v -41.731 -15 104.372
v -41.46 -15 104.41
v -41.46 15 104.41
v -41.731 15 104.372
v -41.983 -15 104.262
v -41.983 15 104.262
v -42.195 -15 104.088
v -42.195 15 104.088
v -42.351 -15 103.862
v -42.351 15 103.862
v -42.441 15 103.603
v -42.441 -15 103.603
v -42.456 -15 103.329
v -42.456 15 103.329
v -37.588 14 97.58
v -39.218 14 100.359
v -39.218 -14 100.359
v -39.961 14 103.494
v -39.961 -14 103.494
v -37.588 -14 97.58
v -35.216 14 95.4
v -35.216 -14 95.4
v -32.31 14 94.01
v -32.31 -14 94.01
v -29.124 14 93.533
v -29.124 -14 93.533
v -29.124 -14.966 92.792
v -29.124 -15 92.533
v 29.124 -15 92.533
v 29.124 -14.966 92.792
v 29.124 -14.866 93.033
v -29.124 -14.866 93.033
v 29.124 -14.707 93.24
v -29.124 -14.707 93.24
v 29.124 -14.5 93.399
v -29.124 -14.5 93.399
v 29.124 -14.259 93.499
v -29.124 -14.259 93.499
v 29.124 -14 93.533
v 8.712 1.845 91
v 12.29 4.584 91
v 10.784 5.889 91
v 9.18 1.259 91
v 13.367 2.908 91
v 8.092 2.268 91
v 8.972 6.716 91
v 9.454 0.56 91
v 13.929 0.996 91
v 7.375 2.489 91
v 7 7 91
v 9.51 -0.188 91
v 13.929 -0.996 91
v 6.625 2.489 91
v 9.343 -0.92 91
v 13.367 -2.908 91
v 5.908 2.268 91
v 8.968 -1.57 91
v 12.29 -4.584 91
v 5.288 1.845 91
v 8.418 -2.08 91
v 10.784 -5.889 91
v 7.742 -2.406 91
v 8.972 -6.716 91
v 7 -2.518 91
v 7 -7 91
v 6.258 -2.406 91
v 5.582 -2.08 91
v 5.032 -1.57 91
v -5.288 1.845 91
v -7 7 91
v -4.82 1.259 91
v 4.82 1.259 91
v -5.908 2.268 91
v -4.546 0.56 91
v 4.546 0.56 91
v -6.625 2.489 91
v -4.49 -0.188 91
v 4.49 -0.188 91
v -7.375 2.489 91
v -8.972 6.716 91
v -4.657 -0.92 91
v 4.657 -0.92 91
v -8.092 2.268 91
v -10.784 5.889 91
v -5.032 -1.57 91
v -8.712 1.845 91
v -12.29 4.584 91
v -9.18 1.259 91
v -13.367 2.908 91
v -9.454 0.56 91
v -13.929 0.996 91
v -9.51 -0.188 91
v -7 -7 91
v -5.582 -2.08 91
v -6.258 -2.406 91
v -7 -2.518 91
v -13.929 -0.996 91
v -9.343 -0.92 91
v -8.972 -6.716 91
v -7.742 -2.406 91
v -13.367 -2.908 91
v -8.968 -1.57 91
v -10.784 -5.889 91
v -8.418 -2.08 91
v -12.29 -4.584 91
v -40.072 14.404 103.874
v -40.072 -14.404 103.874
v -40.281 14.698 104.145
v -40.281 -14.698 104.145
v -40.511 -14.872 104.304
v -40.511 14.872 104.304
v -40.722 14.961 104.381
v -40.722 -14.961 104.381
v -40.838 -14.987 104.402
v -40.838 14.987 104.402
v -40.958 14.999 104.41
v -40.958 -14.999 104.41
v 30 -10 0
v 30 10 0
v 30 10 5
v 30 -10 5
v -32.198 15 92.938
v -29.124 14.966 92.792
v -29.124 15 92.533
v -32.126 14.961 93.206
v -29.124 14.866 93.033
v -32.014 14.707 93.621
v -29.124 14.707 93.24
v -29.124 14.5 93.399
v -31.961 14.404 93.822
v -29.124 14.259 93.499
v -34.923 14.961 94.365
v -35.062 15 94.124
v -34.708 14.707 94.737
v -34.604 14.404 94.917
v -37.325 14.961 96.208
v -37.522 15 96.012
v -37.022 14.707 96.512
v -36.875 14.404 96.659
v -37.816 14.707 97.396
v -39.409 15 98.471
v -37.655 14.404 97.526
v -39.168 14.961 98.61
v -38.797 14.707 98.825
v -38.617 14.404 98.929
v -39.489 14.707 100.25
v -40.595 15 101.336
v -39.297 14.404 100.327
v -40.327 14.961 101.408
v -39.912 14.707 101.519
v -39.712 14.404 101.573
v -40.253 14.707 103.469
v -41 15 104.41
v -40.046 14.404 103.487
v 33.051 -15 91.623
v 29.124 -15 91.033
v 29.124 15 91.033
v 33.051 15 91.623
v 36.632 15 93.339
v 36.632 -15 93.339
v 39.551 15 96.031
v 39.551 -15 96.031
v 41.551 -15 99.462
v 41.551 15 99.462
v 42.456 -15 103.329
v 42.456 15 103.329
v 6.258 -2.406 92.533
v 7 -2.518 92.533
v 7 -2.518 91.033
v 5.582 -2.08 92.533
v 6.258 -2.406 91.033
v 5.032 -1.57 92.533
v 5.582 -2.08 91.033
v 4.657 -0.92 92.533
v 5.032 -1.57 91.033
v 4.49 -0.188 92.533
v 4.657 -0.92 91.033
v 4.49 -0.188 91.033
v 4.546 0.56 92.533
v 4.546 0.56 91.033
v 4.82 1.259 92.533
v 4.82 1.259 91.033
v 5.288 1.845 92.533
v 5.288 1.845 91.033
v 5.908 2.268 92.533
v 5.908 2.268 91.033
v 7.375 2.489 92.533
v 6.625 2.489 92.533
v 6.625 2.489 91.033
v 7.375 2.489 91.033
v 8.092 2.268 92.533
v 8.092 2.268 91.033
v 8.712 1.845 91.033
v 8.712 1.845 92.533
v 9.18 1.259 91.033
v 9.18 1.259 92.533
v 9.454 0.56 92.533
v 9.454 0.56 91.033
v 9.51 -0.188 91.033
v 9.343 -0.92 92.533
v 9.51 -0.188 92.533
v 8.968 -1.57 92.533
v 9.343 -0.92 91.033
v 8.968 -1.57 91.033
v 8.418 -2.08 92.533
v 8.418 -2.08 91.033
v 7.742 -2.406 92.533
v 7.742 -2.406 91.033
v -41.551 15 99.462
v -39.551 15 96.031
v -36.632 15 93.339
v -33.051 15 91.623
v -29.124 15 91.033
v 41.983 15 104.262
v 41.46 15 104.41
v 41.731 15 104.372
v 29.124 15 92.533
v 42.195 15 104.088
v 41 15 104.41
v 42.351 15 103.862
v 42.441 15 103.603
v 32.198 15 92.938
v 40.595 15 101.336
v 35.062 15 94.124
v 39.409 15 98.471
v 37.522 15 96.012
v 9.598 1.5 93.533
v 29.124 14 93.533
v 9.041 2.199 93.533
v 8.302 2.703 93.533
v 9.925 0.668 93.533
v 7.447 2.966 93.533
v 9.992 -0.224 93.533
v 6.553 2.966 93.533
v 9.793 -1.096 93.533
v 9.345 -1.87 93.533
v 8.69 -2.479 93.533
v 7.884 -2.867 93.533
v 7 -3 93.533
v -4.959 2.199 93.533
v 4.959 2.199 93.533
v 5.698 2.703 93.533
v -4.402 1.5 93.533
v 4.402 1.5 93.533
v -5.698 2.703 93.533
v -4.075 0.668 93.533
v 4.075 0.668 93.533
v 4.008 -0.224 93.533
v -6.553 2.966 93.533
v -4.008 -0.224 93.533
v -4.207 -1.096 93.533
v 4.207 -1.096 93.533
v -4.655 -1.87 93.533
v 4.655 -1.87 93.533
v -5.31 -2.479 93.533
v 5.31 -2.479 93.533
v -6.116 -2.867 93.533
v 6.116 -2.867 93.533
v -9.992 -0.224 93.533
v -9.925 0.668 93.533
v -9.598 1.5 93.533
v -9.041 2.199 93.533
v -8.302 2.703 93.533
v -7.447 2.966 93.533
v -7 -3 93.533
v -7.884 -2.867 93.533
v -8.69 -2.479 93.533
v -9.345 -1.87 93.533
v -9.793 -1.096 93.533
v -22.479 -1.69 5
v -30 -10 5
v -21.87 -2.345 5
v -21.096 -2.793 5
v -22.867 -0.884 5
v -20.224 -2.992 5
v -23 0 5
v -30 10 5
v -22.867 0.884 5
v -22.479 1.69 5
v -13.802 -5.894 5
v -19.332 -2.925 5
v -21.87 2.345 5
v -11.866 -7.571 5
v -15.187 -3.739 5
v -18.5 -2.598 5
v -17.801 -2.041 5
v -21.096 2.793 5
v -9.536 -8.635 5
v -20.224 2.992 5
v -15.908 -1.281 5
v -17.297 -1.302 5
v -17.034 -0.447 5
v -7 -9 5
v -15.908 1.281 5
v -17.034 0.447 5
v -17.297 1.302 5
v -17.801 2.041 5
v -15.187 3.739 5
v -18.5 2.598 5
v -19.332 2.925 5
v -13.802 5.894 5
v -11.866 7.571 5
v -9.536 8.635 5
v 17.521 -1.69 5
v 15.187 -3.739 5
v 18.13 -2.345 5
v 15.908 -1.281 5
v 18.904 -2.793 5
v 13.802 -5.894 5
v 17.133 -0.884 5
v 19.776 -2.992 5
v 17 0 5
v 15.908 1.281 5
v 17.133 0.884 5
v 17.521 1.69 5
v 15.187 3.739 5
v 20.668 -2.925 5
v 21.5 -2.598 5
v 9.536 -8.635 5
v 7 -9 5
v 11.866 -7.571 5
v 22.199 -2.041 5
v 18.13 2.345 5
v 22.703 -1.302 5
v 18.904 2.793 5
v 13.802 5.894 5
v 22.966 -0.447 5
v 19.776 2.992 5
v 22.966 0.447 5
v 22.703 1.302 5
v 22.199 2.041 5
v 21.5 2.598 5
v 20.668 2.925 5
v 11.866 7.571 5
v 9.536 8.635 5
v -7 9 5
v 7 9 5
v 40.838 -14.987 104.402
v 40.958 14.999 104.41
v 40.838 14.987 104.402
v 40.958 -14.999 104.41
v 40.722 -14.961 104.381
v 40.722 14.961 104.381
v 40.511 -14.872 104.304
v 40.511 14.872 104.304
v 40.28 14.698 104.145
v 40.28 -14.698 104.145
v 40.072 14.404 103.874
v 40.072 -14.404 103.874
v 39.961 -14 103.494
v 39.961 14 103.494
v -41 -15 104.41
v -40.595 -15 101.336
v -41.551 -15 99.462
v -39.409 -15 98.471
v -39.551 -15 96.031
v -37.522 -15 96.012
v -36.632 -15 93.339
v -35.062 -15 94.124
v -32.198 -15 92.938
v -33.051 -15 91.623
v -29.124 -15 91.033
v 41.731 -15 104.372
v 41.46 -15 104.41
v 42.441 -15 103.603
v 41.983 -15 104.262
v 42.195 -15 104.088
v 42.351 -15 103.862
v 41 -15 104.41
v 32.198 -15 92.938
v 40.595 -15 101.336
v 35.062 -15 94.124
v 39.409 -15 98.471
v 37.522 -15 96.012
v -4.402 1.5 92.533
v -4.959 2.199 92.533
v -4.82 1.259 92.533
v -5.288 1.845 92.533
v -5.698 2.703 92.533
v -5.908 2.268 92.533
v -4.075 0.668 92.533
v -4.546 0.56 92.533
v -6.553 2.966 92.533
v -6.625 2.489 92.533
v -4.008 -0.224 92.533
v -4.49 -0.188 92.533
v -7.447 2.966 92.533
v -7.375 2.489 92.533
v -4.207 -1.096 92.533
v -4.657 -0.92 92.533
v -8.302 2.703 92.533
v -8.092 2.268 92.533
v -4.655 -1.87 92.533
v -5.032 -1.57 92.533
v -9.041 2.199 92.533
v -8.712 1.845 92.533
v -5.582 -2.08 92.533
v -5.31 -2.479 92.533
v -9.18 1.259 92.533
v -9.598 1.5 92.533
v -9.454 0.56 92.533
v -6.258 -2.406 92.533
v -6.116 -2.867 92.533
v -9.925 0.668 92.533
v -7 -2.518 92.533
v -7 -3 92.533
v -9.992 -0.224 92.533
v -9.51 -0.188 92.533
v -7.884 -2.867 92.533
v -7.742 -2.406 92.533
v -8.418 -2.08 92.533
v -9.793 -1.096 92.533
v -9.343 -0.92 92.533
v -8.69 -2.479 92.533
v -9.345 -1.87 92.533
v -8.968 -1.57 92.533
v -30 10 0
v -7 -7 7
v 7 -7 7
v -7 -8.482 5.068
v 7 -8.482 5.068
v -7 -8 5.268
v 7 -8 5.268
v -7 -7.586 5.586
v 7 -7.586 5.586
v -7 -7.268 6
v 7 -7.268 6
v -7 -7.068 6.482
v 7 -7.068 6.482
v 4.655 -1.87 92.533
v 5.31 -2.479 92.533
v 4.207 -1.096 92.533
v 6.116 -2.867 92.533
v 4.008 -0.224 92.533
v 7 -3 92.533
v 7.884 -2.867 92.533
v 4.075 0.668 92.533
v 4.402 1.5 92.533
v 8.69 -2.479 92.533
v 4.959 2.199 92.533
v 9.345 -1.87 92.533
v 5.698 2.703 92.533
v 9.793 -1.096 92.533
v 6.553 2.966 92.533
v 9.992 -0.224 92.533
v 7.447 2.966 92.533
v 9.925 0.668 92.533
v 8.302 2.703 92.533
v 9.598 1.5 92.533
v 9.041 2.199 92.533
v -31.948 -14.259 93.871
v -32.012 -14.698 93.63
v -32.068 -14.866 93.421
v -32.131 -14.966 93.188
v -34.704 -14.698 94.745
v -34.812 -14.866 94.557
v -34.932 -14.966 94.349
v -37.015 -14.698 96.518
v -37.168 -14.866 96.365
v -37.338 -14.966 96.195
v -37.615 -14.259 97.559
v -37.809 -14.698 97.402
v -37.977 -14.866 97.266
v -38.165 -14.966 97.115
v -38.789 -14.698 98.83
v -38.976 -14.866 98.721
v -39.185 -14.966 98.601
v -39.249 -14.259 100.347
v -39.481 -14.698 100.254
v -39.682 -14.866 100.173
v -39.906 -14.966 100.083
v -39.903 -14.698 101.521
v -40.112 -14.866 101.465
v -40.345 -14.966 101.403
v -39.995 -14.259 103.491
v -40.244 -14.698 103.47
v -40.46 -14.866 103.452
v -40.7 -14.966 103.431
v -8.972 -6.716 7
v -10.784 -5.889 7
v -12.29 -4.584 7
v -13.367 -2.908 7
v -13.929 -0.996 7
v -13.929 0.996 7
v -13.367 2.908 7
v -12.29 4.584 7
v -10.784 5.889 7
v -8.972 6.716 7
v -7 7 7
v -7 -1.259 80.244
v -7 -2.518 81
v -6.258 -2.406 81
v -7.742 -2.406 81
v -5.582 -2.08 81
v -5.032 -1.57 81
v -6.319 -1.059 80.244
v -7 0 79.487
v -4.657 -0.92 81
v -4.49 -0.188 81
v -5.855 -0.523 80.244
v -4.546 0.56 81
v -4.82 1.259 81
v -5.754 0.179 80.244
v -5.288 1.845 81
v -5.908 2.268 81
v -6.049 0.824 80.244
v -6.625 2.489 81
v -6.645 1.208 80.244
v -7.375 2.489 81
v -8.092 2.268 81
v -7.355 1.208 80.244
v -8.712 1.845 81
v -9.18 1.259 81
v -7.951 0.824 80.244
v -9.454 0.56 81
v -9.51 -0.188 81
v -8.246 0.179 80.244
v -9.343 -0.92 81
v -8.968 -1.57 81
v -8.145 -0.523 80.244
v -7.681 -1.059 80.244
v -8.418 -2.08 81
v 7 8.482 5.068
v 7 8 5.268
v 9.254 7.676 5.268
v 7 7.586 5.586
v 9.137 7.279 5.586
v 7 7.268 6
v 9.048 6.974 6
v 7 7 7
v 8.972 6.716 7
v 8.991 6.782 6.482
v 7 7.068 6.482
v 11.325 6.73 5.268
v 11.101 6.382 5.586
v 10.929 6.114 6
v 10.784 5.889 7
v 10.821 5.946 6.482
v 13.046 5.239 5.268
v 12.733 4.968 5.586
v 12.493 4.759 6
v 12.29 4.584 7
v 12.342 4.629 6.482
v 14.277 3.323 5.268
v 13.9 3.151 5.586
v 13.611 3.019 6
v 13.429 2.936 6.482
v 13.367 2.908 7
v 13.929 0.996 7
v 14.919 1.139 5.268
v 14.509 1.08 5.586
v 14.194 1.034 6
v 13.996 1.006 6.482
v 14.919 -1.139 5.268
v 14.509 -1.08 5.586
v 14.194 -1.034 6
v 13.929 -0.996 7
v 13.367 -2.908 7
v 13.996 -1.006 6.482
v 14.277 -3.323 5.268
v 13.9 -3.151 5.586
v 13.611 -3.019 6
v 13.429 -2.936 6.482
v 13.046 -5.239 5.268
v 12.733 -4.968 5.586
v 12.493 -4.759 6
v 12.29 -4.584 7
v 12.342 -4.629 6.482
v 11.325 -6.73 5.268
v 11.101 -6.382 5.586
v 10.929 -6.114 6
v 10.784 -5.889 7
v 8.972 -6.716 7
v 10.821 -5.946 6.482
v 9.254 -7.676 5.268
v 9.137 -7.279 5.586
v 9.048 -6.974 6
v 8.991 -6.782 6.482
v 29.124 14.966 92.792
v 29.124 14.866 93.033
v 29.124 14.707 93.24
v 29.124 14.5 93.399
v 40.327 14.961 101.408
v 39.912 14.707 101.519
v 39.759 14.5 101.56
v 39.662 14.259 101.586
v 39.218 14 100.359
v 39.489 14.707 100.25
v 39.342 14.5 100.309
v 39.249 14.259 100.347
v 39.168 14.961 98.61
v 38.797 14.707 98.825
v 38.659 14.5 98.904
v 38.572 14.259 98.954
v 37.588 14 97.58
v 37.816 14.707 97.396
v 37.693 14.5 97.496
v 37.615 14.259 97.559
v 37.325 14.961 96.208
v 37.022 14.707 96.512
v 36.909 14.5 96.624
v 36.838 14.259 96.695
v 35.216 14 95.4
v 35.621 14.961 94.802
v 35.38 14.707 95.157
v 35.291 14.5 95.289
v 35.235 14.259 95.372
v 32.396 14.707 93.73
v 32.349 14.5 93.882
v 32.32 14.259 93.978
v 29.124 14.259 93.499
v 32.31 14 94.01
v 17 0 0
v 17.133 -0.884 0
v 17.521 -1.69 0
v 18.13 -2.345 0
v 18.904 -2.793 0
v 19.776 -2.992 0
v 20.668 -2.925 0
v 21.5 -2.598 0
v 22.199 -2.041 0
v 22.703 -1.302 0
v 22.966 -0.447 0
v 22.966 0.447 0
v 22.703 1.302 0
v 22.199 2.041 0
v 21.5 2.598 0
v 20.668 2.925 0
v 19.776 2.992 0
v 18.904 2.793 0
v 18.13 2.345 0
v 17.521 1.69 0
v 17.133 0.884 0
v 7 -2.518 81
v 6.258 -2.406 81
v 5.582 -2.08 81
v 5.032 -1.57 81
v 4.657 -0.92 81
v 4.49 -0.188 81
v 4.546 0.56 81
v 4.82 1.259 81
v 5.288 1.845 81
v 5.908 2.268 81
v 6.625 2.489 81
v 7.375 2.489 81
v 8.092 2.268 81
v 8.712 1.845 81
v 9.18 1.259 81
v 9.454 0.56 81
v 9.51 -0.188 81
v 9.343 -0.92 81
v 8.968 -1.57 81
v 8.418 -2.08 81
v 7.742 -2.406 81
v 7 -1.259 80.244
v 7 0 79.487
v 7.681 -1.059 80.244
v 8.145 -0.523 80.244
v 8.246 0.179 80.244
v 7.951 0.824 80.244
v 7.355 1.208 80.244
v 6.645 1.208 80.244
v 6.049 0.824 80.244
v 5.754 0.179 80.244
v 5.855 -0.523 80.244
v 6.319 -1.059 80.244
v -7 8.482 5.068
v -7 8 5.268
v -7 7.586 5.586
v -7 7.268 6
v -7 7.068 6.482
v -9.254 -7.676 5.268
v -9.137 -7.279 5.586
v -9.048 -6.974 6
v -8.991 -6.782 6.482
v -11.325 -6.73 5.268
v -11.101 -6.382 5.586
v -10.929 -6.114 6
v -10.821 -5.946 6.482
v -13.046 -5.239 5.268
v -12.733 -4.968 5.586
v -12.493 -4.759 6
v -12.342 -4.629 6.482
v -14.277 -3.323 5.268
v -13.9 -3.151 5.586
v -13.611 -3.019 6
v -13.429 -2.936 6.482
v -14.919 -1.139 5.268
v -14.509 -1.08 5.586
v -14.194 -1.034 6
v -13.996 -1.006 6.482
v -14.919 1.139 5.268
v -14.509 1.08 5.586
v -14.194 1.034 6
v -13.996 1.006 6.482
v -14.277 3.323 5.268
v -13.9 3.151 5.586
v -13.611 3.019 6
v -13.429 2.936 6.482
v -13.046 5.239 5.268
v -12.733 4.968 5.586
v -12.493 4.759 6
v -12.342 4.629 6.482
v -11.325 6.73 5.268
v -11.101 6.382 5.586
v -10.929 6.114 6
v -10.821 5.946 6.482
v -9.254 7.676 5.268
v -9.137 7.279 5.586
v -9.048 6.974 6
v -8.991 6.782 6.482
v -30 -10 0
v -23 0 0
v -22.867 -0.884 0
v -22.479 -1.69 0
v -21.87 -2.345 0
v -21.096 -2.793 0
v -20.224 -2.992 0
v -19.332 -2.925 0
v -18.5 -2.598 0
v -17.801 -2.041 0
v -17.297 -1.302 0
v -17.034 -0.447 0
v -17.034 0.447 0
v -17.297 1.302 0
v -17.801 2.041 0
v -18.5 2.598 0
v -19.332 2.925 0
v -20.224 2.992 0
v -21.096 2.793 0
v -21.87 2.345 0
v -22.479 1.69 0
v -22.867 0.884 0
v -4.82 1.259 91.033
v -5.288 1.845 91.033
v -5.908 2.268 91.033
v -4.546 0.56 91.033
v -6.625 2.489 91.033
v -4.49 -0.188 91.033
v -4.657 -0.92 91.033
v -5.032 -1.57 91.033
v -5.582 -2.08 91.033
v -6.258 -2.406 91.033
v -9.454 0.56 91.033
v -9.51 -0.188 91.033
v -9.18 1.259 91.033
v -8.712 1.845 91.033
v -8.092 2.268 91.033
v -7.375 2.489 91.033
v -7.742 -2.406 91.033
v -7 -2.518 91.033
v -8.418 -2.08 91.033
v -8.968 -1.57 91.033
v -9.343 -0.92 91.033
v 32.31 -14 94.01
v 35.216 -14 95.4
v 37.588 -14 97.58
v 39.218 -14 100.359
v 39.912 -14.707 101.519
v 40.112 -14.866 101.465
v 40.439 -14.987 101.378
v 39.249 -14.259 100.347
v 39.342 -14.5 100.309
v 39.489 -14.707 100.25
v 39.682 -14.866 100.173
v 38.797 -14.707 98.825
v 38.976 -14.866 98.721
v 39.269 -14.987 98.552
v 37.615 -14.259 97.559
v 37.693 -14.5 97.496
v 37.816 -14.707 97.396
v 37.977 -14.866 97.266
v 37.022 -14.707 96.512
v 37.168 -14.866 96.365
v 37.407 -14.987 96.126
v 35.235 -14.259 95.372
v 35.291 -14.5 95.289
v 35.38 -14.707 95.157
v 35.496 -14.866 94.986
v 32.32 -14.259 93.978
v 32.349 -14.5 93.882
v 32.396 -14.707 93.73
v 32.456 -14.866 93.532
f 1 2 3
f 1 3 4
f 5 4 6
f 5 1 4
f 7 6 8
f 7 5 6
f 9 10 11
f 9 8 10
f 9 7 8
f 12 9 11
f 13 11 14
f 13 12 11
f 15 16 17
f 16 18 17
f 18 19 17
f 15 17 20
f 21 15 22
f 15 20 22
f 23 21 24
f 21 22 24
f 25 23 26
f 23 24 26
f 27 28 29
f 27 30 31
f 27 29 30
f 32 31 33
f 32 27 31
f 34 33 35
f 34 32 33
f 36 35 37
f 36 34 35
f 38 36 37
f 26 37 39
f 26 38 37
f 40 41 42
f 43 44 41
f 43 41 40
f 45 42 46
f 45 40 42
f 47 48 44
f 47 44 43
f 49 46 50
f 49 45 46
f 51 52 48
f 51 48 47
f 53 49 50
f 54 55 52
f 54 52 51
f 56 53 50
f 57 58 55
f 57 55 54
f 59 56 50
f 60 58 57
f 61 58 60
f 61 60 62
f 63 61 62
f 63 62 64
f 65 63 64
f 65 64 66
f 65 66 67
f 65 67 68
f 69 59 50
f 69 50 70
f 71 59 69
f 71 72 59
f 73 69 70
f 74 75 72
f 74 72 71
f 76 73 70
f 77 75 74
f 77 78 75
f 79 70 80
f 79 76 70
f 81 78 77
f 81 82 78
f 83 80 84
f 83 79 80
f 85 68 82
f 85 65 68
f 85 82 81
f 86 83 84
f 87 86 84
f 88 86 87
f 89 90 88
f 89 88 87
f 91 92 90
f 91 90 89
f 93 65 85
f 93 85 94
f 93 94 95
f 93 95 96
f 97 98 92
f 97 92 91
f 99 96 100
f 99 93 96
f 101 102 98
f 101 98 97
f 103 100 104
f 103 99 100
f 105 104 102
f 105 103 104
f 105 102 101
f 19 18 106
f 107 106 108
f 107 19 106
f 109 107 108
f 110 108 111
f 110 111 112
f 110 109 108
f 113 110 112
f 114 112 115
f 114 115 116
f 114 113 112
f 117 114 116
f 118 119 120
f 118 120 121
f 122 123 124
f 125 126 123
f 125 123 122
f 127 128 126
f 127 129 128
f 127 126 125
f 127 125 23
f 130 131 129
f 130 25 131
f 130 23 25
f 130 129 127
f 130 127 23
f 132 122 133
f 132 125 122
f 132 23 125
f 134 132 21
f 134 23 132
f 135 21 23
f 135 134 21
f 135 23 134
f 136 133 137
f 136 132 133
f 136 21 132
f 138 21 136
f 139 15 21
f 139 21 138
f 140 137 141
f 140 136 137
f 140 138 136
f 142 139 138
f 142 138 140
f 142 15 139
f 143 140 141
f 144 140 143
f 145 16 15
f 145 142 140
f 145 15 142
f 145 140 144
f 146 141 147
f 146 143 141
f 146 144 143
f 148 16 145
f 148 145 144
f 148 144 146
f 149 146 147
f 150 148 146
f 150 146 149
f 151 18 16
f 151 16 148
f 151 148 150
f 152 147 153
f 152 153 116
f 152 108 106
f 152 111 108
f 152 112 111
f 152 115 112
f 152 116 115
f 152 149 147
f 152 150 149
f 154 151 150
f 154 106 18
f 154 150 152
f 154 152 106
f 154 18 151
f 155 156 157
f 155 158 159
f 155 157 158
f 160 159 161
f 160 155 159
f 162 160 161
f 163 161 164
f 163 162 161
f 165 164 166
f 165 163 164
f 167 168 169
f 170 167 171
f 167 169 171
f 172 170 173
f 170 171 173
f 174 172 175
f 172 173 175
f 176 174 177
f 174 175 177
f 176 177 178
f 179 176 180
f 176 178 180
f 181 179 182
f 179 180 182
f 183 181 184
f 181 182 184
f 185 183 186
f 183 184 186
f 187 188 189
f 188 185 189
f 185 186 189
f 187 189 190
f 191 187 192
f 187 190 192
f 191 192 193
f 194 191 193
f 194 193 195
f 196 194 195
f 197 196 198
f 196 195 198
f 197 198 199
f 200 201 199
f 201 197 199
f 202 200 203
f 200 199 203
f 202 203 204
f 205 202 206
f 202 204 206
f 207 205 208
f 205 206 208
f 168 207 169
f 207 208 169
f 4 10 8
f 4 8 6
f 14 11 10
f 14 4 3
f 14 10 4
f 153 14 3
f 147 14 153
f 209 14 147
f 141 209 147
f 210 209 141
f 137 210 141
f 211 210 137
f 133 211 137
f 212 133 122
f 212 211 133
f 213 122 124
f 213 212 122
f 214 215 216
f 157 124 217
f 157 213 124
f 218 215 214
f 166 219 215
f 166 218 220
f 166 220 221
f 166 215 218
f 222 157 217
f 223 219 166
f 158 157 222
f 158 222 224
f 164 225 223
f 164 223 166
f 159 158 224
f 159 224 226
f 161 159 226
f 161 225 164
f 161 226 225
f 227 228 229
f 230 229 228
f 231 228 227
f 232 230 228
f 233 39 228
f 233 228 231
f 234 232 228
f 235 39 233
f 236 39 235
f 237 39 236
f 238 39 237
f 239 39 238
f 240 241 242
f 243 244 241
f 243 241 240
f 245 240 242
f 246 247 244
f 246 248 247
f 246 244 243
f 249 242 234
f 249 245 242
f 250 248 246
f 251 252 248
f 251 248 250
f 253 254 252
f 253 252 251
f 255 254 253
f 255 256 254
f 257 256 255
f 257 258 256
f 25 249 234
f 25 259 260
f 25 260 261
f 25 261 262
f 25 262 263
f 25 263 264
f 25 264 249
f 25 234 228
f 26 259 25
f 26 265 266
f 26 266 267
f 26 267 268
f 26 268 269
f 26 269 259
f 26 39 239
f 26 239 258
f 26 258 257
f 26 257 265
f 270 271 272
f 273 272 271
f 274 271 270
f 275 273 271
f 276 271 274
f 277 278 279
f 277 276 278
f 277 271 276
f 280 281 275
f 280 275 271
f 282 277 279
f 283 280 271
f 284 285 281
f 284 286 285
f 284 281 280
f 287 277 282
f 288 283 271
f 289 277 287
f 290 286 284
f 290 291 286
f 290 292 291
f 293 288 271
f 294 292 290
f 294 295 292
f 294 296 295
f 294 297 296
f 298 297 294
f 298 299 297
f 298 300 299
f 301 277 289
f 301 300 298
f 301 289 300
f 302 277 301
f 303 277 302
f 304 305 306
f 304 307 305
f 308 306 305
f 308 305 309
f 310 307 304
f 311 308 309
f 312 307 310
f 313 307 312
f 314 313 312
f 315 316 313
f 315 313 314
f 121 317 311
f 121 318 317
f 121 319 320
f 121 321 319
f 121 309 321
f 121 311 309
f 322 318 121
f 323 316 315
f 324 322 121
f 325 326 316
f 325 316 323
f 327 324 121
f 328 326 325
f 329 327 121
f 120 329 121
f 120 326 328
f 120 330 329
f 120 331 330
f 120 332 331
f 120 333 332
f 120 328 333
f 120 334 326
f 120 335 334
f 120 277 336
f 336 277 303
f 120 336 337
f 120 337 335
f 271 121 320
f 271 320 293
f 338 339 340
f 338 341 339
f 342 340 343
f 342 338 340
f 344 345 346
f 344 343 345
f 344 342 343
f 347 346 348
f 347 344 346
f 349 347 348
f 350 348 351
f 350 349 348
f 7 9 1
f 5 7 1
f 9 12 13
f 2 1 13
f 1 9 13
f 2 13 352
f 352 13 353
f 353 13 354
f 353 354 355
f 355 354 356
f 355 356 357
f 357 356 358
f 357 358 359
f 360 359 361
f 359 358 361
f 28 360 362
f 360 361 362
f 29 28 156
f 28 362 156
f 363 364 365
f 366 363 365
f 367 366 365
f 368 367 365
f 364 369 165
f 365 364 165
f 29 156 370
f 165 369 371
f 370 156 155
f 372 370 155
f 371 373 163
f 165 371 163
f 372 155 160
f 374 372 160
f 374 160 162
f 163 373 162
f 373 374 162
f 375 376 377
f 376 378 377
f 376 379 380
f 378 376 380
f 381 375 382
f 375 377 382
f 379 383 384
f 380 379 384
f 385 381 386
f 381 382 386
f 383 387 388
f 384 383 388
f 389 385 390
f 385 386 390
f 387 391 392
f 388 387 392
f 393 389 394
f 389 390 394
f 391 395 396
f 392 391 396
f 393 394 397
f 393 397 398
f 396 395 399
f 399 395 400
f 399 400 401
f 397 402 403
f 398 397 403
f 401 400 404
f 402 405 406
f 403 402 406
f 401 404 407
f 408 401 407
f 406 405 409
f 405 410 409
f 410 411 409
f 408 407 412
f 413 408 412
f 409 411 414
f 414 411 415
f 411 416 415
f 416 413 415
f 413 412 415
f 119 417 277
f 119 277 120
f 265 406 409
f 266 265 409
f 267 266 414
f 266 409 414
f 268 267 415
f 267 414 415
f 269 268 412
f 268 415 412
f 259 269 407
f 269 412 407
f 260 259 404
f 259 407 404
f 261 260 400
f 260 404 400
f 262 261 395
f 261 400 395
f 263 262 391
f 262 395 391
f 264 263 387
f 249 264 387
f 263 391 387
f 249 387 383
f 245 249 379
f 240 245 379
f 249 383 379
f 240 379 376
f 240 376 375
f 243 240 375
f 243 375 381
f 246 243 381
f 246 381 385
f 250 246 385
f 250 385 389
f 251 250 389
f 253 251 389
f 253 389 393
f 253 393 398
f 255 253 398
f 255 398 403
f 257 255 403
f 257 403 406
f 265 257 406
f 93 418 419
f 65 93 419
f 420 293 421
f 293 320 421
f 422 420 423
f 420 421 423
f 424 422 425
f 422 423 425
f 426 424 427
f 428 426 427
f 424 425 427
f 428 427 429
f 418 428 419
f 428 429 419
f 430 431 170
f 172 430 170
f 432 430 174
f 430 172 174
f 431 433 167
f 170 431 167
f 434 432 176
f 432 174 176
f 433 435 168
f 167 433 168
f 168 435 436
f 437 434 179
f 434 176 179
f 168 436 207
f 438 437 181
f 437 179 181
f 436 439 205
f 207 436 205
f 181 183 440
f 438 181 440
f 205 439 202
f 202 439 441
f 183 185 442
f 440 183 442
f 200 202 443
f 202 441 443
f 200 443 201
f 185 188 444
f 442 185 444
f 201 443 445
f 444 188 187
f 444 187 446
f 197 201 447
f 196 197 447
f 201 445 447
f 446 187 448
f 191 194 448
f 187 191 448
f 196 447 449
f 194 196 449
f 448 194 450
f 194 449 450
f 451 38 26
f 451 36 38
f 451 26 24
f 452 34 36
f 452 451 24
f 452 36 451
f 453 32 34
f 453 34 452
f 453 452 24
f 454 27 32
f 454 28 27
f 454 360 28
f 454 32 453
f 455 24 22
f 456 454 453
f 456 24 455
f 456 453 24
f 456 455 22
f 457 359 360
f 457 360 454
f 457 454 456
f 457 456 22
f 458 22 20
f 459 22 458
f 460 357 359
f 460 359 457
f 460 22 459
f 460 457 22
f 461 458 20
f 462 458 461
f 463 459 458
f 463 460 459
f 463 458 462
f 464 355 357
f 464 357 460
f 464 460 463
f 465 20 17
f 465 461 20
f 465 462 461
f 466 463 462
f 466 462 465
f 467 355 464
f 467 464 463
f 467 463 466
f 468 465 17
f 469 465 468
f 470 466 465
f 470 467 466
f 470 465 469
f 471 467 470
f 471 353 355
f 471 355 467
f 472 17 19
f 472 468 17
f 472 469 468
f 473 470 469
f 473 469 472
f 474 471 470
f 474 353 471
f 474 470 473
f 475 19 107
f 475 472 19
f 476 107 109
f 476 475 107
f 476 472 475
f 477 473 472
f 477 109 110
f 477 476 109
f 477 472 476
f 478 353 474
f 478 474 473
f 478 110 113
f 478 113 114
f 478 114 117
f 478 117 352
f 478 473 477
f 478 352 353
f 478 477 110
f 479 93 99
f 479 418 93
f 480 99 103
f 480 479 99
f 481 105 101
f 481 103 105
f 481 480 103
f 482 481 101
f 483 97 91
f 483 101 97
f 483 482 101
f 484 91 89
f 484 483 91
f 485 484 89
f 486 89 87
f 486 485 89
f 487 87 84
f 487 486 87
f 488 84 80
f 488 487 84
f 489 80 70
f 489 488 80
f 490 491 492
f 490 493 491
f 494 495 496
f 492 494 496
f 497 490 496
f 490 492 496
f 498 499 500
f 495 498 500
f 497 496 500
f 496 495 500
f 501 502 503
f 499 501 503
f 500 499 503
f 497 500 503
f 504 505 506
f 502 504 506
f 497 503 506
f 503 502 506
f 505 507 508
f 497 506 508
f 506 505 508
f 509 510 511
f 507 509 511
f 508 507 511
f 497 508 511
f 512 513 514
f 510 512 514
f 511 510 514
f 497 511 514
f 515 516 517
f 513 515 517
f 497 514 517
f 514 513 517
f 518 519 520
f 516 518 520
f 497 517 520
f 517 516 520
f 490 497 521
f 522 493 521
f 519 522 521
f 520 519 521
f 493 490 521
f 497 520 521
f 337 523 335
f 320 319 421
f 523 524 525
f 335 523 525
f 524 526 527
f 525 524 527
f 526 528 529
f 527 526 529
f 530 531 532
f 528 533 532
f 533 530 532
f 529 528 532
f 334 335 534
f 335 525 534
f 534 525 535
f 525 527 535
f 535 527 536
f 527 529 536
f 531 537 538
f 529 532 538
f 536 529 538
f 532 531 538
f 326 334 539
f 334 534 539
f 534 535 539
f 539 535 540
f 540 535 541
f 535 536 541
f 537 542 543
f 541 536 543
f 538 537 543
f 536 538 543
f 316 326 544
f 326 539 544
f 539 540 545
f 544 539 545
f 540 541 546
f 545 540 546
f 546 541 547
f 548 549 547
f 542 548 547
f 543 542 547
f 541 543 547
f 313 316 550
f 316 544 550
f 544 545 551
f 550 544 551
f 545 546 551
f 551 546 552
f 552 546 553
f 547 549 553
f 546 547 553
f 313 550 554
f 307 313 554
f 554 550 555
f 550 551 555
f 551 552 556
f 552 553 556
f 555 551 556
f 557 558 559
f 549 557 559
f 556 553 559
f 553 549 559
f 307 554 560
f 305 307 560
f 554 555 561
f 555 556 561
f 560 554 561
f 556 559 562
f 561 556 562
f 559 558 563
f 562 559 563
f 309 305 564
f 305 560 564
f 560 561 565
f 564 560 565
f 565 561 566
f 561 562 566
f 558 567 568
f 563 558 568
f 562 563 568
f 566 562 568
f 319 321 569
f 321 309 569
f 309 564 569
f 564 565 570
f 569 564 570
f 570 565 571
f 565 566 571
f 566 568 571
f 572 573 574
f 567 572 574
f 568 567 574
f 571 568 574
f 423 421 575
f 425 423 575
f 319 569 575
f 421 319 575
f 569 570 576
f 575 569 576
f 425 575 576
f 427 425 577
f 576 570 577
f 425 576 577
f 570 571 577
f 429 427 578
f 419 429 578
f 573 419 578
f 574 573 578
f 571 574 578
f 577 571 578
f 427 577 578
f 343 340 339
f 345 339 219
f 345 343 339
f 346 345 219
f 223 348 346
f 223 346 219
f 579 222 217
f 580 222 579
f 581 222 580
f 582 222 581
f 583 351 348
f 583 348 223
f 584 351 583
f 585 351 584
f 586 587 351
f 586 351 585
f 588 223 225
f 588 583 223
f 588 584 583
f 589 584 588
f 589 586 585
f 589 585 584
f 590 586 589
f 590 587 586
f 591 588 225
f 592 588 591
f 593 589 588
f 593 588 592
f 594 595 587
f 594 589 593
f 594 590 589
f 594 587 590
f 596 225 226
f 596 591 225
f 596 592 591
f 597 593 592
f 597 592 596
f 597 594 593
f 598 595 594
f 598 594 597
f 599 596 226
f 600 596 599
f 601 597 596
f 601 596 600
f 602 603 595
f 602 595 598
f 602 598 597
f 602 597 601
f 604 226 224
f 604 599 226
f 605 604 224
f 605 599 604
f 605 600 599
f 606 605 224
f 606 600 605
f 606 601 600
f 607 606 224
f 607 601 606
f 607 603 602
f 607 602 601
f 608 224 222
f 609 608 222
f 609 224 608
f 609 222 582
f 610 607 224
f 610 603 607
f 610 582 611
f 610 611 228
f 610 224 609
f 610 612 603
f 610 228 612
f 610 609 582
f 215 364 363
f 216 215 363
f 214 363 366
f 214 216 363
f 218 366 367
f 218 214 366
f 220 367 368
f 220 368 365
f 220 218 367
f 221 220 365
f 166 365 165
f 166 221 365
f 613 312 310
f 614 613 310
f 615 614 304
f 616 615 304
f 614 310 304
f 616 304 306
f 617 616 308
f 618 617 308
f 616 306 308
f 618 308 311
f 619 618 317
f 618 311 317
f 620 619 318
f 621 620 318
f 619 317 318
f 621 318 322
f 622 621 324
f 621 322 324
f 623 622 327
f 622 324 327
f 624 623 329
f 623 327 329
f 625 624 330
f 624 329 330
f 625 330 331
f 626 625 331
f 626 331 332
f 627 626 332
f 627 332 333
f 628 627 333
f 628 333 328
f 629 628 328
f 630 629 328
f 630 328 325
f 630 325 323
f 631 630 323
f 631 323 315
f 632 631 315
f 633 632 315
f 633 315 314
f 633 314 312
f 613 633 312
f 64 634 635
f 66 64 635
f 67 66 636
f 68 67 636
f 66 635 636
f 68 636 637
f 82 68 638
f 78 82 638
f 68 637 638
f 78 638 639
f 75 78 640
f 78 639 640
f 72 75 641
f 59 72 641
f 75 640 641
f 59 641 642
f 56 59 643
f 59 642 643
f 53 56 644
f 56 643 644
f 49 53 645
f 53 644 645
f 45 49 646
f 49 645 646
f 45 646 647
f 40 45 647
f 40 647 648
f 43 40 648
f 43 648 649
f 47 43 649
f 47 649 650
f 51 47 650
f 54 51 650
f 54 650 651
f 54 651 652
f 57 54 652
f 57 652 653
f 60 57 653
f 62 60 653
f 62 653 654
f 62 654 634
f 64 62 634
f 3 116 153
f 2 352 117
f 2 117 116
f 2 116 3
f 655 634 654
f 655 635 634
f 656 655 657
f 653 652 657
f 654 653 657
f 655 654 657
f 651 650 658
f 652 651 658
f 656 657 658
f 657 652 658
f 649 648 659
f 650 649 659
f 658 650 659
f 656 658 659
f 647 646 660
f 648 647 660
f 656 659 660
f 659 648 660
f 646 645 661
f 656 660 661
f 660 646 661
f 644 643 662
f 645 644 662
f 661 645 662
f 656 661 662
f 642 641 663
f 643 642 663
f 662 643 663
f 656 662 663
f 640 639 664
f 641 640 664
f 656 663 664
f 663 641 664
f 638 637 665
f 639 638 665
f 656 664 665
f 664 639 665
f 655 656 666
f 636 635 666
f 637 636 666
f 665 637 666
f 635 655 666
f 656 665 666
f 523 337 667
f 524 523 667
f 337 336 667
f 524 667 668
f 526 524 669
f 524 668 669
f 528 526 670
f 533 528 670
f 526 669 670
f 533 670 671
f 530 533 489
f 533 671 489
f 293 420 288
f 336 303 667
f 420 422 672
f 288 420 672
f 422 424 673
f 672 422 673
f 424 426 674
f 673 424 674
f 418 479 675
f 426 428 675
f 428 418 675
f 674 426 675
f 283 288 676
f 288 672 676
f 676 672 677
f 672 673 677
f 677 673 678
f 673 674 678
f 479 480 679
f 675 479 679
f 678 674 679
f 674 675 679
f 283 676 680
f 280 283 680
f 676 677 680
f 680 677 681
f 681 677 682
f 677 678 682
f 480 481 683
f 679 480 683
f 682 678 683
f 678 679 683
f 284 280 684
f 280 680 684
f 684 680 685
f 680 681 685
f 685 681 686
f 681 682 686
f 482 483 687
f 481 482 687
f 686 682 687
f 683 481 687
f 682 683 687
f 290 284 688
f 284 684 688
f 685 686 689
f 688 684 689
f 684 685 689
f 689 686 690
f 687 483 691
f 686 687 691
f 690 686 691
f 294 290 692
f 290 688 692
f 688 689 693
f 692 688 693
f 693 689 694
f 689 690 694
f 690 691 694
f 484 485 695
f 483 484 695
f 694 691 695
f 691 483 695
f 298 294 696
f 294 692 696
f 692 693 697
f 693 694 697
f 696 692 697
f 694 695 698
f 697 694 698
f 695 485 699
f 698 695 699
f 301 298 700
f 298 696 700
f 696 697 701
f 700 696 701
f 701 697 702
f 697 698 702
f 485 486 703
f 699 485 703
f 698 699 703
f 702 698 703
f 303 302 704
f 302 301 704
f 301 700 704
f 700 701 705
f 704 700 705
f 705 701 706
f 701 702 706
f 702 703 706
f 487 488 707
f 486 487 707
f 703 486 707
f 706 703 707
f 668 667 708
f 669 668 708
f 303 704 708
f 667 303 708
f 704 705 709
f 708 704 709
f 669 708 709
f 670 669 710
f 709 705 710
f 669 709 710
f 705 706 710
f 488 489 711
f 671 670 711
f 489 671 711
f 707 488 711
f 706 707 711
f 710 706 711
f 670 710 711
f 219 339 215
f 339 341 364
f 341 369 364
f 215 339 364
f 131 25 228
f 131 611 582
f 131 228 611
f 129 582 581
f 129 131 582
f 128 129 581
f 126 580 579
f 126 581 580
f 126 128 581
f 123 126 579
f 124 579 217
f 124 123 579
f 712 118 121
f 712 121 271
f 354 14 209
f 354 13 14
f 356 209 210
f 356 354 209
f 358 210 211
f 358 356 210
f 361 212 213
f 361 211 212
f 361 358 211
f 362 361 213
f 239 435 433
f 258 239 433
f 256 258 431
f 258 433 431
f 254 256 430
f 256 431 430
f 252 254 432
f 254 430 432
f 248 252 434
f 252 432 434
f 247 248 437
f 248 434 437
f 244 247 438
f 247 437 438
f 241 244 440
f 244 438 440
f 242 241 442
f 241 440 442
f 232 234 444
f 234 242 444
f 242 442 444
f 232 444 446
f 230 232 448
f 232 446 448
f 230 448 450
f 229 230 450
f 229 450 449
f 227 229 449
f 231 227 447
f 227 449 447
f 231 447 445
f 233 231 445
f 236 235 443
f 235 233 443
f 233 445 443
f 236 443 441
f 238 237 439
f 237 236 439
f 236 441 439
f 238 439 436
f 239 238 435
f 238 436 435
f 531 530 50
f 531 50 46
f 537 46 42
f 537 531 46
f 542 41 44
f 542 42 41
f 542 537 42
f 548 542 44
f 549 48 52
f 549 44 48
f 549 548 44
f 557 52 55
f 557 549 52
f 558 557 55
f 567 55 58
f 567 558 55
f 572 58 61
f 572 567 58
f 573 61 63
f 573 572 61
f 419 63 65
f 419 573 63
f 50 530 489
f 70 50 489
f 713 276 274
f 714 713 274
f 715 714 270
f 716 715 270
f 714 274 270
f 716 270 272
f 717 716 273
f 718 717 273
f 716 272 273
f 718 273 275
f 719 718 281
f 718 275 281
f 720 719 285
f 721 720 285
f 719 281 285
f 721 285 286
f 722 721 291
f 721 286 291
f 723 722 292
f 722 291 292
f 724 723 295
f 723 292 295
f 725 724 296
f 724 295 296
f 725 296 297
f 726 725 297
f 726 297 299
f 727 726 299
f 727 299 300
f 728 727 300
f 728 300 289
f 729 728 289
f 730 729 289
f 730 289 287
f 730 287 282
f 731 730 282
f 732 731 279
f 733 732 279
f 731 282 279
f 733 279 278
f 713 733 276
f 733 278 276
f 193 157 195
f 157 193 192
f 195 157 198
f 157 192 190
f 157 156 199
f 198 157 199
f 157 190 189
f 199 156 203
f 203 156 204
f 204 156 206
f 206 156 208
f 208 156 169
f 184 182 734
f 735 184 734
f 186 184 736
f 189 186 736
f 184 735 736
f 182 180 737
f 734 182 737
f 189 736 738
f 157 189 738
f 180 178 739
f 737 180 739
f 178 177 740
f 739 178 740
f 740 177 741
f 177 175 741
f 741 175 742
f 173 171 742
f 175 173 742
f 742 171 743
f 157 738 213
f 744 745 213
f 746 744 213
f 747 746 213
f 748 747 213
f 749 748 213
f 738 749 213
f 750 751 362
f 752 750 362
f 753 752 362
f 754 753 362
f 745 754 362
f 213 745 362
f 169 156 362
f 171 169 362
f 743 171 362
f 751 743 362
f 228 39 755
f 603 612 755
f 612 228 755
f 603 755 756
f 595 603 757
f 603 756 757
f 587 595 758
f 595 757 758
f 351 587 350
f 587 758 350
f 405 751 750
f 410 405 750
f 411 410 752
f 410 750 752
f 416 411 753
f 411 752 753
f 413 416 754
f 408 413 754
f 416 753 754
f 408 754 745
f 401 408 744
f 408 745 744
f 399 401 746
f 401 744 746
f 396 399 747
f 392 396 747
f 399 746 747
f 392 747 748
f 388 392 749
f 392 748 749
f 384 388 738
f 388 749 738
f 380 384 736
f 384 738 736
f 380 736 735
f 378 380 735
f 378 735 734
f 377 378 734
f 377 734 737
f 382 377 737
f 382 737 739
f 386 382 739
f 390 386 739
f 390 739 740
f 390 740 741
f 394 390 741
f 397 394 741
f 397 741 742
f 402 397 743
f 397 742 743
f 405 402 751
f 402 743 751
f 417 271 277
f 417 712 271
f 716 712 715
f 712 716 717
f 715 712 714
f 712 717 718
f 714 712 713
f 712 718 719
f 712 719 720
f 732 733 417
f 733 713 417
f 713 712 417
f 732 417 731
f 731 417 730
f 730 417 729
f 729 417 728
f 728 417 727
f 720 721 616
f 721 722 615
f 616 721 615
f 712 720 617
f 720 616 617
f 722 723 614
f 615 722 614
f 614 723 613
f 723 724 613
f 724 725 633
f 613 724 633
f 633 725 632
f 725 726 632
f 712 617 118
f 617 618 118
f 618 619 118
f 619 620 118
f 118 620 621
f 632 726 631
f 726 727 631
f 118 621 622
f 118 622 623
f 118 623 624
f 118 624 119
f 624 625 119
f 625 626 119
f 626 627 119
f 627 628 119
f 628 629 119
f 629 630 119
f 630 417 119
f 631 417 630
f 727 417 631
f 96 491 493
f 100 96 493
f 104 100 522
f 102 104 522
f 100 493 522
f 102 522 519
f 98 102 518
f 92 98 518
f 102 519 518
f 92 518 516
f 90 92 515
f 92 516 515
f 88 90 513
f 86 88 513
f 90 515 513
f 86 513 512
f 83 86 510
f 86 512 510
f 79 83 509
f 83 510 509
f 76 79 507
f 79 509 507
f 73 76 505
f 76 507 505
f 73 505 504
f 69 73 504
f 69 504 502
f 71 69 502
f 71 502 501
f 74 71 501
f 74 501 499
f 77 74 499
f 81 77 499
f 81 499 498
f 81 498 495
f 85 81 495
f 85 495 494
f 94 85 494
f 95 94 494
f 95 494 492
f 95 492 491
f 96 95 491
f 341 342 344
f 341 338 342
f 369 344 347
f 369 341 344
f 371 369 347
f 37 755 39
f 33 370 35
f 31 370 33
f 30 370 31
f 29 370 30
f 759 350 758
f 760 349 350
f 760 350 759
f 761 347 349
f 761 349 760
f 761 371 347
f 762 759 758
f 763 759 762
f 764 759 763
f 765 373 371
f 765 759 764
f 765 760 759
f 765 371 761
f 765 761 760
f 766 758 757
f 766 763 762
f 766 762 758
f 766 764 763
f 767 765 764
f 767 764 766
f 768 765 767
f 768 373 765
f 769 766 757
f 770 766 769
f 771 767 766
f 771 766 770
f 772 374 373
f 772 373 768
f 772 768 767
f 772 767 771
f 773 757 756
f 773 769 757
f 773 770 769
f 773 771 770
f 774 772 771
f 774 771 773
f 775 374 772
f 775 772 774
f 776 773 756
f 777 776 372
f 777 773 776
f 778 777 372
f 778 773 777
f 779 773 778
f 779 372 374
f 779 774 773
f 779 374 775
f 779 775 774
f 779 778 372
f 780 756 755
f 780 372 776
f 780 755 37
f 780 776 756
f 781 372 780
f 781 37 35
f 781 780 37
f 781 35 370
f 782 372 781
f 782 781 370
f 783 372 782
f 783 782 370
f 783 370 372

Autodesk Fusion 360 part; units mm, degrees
sketch "Boceto1" plane through (0, 0, 0) normal (0, 0, 1) x (1, 0, 0)
  line L0 (-30, 10) -> (30, 10)
  line L1 (30, 10) -> (30, -10)
  line L2 (30, -10) -> (-30, -10)
  line L3 (-30, -10) -> (-30, 10)
  point P0 (0, 10)
  point P1 (-30, 0)
  dimension "d1" = 60
  dimension "d2" = 20
extrude "Extruir1" add sketch "Boceto1" along normal blind 5 makes body 1
sketch "Boceto2" plane through (0, 0, 5) normal (0, 0, 1) x (-1, 0, 0)
  line L0 (30, 10) -> (-30, 10)
  line L1 (-30, 10) -> (-30, -10)
  line L2 (-30, -10) -> (30, -10)
  line L3 (30, -10) -> (30, 10)
  line L4 (7, 7) -> (-7, 7)
  arc A0 (-7, 7) -> (-7, -7) centre (-7, 0) ccw
  line L5 (-7, -7) -> (7, -7)
  arc A1 (7, -7) -> (7, 7) centre (7, 0) ccw
  line L6 (7, 0) -> (-7, 0) construction
  dimension "d30" = 14
  dimension "d31" = 7
extrude "Extruir2" add sketch "Boceto2" along normal blind 86 contours L4 A0 L5 A1 bodies 1
sketch "Boceto3" plane through (0, 0, 0) normal (0, 1, 0) x (1, 0, 0)
  arc A0 (42.5, -104.4096) -> (29.1237, -91.0333) centre (29.1237, -104.4096) ccw
  line L0 (29.1237, -91.0333) -> (-29.1237, -91.0333)
  arc A1 (-29.1237, -91.0333) -> (-42.5, -104.4096) centre (-29.1237, -104.4096) ccw
  line L1 (-29.1237, -104.4096) -> (29.1237, -104.4096) construction
  arc A2 (40, -104.4096) -> (29.1237, -93.5333) centre (29.1237, -104.4096) ccw
  line L2 (29.1237, -93.5333) -> (-29.1237, -93.5333)
  arc A3 (-29.1237, -93.5333) -> (-40, -104.4096) centre (-29.1237, -104.4096) ccw
  line L3 (-29.1237, -104.4096) -> (29.1237, -104.4096) construction
  line L4 (-40, -104.4096) -> (-42.5, -104.4096)
  line L5 (40, -104.4096) -> (42.5, -104.4096)
  point P0 (0, -104.4096)
  dimension "d9" = 85
extrude "Extruir3" add sketch "Boceto3" along normal blind 15 and the other way blind 15 separate body makes body 2
fillet "Empalme1" radius 2 4 edges at (14, 0, 5) (0, -7, 5) (-14, 0, 5) (0, 7, 5) on bodies 1
sketch "Boceto4" plane through (0, 0, 5) normal (0, 0, 1) x (-1, 0, 0)
  line L0 (30, 10) -> (-30, 10)
  line L1 (-30, 10) -> (-30, -10)
  line L2 (-30, -10) -> (30, -10)
  line L3 (30, -10) -> (30, 10)
  circle A0 centre (20, 0) radius 3
  circle A1 centre (-20, 0) radius 3
  arc A2 (-7, 9) -> (-7, -9) centre (-7, 0) ccw
  line L4 (-7, 9) -> (7, 9)
  arc A3 (7, -9) -> (7, 9) centre (7, 0) ccw
  line L5 (7, -9) -> (-7, -9)
  dimension "d16" = 6
  dimension "d17" = 6
  dimension "d18" = 40
extrude "Extruir4" cut sketch "Boceto4" against normal blind 10 contours A0 | A1 bodies 1
hole "Agujero1" at (7, 0, 91) direction (0, 0, -1) diameter 5.035 depth 10 tip angle 118 bodies 1
hole "Agujero2" at (-7, 0, 91) direction (0, 0, -1) diameter 5.035 depth 10 tip angle 118 bodies 1
fillet "Empalme2" radius 1 8 edges at (-40, 0, 104.4096) (36.8144, -15, 96.7189) (0, -15, 93.5333) (-36.8144, -15, 96.7189) (-36.8144, 15, 96.7189) (0, 15, 93.5333) (36.8144, 15, 96.7189) (40, 0, 104.4096) on bodies 2
fillet "Empalme3" radius 1 2 edges at (-42.5, 0, 104.4096) (42.5, 0, 104.4096) on bodies 2
hole "Agujero3" at (-7, 0, 93.5333) direction (0, 0, -1) diameter 5.035 depth 10 tip angle 118 counterbore diameter 6 counterbore depth 1 bodies 2
mirror "Simetría1" about plane through (0, 0, 0) normal (1, 0, 0) of "Agujero3"
